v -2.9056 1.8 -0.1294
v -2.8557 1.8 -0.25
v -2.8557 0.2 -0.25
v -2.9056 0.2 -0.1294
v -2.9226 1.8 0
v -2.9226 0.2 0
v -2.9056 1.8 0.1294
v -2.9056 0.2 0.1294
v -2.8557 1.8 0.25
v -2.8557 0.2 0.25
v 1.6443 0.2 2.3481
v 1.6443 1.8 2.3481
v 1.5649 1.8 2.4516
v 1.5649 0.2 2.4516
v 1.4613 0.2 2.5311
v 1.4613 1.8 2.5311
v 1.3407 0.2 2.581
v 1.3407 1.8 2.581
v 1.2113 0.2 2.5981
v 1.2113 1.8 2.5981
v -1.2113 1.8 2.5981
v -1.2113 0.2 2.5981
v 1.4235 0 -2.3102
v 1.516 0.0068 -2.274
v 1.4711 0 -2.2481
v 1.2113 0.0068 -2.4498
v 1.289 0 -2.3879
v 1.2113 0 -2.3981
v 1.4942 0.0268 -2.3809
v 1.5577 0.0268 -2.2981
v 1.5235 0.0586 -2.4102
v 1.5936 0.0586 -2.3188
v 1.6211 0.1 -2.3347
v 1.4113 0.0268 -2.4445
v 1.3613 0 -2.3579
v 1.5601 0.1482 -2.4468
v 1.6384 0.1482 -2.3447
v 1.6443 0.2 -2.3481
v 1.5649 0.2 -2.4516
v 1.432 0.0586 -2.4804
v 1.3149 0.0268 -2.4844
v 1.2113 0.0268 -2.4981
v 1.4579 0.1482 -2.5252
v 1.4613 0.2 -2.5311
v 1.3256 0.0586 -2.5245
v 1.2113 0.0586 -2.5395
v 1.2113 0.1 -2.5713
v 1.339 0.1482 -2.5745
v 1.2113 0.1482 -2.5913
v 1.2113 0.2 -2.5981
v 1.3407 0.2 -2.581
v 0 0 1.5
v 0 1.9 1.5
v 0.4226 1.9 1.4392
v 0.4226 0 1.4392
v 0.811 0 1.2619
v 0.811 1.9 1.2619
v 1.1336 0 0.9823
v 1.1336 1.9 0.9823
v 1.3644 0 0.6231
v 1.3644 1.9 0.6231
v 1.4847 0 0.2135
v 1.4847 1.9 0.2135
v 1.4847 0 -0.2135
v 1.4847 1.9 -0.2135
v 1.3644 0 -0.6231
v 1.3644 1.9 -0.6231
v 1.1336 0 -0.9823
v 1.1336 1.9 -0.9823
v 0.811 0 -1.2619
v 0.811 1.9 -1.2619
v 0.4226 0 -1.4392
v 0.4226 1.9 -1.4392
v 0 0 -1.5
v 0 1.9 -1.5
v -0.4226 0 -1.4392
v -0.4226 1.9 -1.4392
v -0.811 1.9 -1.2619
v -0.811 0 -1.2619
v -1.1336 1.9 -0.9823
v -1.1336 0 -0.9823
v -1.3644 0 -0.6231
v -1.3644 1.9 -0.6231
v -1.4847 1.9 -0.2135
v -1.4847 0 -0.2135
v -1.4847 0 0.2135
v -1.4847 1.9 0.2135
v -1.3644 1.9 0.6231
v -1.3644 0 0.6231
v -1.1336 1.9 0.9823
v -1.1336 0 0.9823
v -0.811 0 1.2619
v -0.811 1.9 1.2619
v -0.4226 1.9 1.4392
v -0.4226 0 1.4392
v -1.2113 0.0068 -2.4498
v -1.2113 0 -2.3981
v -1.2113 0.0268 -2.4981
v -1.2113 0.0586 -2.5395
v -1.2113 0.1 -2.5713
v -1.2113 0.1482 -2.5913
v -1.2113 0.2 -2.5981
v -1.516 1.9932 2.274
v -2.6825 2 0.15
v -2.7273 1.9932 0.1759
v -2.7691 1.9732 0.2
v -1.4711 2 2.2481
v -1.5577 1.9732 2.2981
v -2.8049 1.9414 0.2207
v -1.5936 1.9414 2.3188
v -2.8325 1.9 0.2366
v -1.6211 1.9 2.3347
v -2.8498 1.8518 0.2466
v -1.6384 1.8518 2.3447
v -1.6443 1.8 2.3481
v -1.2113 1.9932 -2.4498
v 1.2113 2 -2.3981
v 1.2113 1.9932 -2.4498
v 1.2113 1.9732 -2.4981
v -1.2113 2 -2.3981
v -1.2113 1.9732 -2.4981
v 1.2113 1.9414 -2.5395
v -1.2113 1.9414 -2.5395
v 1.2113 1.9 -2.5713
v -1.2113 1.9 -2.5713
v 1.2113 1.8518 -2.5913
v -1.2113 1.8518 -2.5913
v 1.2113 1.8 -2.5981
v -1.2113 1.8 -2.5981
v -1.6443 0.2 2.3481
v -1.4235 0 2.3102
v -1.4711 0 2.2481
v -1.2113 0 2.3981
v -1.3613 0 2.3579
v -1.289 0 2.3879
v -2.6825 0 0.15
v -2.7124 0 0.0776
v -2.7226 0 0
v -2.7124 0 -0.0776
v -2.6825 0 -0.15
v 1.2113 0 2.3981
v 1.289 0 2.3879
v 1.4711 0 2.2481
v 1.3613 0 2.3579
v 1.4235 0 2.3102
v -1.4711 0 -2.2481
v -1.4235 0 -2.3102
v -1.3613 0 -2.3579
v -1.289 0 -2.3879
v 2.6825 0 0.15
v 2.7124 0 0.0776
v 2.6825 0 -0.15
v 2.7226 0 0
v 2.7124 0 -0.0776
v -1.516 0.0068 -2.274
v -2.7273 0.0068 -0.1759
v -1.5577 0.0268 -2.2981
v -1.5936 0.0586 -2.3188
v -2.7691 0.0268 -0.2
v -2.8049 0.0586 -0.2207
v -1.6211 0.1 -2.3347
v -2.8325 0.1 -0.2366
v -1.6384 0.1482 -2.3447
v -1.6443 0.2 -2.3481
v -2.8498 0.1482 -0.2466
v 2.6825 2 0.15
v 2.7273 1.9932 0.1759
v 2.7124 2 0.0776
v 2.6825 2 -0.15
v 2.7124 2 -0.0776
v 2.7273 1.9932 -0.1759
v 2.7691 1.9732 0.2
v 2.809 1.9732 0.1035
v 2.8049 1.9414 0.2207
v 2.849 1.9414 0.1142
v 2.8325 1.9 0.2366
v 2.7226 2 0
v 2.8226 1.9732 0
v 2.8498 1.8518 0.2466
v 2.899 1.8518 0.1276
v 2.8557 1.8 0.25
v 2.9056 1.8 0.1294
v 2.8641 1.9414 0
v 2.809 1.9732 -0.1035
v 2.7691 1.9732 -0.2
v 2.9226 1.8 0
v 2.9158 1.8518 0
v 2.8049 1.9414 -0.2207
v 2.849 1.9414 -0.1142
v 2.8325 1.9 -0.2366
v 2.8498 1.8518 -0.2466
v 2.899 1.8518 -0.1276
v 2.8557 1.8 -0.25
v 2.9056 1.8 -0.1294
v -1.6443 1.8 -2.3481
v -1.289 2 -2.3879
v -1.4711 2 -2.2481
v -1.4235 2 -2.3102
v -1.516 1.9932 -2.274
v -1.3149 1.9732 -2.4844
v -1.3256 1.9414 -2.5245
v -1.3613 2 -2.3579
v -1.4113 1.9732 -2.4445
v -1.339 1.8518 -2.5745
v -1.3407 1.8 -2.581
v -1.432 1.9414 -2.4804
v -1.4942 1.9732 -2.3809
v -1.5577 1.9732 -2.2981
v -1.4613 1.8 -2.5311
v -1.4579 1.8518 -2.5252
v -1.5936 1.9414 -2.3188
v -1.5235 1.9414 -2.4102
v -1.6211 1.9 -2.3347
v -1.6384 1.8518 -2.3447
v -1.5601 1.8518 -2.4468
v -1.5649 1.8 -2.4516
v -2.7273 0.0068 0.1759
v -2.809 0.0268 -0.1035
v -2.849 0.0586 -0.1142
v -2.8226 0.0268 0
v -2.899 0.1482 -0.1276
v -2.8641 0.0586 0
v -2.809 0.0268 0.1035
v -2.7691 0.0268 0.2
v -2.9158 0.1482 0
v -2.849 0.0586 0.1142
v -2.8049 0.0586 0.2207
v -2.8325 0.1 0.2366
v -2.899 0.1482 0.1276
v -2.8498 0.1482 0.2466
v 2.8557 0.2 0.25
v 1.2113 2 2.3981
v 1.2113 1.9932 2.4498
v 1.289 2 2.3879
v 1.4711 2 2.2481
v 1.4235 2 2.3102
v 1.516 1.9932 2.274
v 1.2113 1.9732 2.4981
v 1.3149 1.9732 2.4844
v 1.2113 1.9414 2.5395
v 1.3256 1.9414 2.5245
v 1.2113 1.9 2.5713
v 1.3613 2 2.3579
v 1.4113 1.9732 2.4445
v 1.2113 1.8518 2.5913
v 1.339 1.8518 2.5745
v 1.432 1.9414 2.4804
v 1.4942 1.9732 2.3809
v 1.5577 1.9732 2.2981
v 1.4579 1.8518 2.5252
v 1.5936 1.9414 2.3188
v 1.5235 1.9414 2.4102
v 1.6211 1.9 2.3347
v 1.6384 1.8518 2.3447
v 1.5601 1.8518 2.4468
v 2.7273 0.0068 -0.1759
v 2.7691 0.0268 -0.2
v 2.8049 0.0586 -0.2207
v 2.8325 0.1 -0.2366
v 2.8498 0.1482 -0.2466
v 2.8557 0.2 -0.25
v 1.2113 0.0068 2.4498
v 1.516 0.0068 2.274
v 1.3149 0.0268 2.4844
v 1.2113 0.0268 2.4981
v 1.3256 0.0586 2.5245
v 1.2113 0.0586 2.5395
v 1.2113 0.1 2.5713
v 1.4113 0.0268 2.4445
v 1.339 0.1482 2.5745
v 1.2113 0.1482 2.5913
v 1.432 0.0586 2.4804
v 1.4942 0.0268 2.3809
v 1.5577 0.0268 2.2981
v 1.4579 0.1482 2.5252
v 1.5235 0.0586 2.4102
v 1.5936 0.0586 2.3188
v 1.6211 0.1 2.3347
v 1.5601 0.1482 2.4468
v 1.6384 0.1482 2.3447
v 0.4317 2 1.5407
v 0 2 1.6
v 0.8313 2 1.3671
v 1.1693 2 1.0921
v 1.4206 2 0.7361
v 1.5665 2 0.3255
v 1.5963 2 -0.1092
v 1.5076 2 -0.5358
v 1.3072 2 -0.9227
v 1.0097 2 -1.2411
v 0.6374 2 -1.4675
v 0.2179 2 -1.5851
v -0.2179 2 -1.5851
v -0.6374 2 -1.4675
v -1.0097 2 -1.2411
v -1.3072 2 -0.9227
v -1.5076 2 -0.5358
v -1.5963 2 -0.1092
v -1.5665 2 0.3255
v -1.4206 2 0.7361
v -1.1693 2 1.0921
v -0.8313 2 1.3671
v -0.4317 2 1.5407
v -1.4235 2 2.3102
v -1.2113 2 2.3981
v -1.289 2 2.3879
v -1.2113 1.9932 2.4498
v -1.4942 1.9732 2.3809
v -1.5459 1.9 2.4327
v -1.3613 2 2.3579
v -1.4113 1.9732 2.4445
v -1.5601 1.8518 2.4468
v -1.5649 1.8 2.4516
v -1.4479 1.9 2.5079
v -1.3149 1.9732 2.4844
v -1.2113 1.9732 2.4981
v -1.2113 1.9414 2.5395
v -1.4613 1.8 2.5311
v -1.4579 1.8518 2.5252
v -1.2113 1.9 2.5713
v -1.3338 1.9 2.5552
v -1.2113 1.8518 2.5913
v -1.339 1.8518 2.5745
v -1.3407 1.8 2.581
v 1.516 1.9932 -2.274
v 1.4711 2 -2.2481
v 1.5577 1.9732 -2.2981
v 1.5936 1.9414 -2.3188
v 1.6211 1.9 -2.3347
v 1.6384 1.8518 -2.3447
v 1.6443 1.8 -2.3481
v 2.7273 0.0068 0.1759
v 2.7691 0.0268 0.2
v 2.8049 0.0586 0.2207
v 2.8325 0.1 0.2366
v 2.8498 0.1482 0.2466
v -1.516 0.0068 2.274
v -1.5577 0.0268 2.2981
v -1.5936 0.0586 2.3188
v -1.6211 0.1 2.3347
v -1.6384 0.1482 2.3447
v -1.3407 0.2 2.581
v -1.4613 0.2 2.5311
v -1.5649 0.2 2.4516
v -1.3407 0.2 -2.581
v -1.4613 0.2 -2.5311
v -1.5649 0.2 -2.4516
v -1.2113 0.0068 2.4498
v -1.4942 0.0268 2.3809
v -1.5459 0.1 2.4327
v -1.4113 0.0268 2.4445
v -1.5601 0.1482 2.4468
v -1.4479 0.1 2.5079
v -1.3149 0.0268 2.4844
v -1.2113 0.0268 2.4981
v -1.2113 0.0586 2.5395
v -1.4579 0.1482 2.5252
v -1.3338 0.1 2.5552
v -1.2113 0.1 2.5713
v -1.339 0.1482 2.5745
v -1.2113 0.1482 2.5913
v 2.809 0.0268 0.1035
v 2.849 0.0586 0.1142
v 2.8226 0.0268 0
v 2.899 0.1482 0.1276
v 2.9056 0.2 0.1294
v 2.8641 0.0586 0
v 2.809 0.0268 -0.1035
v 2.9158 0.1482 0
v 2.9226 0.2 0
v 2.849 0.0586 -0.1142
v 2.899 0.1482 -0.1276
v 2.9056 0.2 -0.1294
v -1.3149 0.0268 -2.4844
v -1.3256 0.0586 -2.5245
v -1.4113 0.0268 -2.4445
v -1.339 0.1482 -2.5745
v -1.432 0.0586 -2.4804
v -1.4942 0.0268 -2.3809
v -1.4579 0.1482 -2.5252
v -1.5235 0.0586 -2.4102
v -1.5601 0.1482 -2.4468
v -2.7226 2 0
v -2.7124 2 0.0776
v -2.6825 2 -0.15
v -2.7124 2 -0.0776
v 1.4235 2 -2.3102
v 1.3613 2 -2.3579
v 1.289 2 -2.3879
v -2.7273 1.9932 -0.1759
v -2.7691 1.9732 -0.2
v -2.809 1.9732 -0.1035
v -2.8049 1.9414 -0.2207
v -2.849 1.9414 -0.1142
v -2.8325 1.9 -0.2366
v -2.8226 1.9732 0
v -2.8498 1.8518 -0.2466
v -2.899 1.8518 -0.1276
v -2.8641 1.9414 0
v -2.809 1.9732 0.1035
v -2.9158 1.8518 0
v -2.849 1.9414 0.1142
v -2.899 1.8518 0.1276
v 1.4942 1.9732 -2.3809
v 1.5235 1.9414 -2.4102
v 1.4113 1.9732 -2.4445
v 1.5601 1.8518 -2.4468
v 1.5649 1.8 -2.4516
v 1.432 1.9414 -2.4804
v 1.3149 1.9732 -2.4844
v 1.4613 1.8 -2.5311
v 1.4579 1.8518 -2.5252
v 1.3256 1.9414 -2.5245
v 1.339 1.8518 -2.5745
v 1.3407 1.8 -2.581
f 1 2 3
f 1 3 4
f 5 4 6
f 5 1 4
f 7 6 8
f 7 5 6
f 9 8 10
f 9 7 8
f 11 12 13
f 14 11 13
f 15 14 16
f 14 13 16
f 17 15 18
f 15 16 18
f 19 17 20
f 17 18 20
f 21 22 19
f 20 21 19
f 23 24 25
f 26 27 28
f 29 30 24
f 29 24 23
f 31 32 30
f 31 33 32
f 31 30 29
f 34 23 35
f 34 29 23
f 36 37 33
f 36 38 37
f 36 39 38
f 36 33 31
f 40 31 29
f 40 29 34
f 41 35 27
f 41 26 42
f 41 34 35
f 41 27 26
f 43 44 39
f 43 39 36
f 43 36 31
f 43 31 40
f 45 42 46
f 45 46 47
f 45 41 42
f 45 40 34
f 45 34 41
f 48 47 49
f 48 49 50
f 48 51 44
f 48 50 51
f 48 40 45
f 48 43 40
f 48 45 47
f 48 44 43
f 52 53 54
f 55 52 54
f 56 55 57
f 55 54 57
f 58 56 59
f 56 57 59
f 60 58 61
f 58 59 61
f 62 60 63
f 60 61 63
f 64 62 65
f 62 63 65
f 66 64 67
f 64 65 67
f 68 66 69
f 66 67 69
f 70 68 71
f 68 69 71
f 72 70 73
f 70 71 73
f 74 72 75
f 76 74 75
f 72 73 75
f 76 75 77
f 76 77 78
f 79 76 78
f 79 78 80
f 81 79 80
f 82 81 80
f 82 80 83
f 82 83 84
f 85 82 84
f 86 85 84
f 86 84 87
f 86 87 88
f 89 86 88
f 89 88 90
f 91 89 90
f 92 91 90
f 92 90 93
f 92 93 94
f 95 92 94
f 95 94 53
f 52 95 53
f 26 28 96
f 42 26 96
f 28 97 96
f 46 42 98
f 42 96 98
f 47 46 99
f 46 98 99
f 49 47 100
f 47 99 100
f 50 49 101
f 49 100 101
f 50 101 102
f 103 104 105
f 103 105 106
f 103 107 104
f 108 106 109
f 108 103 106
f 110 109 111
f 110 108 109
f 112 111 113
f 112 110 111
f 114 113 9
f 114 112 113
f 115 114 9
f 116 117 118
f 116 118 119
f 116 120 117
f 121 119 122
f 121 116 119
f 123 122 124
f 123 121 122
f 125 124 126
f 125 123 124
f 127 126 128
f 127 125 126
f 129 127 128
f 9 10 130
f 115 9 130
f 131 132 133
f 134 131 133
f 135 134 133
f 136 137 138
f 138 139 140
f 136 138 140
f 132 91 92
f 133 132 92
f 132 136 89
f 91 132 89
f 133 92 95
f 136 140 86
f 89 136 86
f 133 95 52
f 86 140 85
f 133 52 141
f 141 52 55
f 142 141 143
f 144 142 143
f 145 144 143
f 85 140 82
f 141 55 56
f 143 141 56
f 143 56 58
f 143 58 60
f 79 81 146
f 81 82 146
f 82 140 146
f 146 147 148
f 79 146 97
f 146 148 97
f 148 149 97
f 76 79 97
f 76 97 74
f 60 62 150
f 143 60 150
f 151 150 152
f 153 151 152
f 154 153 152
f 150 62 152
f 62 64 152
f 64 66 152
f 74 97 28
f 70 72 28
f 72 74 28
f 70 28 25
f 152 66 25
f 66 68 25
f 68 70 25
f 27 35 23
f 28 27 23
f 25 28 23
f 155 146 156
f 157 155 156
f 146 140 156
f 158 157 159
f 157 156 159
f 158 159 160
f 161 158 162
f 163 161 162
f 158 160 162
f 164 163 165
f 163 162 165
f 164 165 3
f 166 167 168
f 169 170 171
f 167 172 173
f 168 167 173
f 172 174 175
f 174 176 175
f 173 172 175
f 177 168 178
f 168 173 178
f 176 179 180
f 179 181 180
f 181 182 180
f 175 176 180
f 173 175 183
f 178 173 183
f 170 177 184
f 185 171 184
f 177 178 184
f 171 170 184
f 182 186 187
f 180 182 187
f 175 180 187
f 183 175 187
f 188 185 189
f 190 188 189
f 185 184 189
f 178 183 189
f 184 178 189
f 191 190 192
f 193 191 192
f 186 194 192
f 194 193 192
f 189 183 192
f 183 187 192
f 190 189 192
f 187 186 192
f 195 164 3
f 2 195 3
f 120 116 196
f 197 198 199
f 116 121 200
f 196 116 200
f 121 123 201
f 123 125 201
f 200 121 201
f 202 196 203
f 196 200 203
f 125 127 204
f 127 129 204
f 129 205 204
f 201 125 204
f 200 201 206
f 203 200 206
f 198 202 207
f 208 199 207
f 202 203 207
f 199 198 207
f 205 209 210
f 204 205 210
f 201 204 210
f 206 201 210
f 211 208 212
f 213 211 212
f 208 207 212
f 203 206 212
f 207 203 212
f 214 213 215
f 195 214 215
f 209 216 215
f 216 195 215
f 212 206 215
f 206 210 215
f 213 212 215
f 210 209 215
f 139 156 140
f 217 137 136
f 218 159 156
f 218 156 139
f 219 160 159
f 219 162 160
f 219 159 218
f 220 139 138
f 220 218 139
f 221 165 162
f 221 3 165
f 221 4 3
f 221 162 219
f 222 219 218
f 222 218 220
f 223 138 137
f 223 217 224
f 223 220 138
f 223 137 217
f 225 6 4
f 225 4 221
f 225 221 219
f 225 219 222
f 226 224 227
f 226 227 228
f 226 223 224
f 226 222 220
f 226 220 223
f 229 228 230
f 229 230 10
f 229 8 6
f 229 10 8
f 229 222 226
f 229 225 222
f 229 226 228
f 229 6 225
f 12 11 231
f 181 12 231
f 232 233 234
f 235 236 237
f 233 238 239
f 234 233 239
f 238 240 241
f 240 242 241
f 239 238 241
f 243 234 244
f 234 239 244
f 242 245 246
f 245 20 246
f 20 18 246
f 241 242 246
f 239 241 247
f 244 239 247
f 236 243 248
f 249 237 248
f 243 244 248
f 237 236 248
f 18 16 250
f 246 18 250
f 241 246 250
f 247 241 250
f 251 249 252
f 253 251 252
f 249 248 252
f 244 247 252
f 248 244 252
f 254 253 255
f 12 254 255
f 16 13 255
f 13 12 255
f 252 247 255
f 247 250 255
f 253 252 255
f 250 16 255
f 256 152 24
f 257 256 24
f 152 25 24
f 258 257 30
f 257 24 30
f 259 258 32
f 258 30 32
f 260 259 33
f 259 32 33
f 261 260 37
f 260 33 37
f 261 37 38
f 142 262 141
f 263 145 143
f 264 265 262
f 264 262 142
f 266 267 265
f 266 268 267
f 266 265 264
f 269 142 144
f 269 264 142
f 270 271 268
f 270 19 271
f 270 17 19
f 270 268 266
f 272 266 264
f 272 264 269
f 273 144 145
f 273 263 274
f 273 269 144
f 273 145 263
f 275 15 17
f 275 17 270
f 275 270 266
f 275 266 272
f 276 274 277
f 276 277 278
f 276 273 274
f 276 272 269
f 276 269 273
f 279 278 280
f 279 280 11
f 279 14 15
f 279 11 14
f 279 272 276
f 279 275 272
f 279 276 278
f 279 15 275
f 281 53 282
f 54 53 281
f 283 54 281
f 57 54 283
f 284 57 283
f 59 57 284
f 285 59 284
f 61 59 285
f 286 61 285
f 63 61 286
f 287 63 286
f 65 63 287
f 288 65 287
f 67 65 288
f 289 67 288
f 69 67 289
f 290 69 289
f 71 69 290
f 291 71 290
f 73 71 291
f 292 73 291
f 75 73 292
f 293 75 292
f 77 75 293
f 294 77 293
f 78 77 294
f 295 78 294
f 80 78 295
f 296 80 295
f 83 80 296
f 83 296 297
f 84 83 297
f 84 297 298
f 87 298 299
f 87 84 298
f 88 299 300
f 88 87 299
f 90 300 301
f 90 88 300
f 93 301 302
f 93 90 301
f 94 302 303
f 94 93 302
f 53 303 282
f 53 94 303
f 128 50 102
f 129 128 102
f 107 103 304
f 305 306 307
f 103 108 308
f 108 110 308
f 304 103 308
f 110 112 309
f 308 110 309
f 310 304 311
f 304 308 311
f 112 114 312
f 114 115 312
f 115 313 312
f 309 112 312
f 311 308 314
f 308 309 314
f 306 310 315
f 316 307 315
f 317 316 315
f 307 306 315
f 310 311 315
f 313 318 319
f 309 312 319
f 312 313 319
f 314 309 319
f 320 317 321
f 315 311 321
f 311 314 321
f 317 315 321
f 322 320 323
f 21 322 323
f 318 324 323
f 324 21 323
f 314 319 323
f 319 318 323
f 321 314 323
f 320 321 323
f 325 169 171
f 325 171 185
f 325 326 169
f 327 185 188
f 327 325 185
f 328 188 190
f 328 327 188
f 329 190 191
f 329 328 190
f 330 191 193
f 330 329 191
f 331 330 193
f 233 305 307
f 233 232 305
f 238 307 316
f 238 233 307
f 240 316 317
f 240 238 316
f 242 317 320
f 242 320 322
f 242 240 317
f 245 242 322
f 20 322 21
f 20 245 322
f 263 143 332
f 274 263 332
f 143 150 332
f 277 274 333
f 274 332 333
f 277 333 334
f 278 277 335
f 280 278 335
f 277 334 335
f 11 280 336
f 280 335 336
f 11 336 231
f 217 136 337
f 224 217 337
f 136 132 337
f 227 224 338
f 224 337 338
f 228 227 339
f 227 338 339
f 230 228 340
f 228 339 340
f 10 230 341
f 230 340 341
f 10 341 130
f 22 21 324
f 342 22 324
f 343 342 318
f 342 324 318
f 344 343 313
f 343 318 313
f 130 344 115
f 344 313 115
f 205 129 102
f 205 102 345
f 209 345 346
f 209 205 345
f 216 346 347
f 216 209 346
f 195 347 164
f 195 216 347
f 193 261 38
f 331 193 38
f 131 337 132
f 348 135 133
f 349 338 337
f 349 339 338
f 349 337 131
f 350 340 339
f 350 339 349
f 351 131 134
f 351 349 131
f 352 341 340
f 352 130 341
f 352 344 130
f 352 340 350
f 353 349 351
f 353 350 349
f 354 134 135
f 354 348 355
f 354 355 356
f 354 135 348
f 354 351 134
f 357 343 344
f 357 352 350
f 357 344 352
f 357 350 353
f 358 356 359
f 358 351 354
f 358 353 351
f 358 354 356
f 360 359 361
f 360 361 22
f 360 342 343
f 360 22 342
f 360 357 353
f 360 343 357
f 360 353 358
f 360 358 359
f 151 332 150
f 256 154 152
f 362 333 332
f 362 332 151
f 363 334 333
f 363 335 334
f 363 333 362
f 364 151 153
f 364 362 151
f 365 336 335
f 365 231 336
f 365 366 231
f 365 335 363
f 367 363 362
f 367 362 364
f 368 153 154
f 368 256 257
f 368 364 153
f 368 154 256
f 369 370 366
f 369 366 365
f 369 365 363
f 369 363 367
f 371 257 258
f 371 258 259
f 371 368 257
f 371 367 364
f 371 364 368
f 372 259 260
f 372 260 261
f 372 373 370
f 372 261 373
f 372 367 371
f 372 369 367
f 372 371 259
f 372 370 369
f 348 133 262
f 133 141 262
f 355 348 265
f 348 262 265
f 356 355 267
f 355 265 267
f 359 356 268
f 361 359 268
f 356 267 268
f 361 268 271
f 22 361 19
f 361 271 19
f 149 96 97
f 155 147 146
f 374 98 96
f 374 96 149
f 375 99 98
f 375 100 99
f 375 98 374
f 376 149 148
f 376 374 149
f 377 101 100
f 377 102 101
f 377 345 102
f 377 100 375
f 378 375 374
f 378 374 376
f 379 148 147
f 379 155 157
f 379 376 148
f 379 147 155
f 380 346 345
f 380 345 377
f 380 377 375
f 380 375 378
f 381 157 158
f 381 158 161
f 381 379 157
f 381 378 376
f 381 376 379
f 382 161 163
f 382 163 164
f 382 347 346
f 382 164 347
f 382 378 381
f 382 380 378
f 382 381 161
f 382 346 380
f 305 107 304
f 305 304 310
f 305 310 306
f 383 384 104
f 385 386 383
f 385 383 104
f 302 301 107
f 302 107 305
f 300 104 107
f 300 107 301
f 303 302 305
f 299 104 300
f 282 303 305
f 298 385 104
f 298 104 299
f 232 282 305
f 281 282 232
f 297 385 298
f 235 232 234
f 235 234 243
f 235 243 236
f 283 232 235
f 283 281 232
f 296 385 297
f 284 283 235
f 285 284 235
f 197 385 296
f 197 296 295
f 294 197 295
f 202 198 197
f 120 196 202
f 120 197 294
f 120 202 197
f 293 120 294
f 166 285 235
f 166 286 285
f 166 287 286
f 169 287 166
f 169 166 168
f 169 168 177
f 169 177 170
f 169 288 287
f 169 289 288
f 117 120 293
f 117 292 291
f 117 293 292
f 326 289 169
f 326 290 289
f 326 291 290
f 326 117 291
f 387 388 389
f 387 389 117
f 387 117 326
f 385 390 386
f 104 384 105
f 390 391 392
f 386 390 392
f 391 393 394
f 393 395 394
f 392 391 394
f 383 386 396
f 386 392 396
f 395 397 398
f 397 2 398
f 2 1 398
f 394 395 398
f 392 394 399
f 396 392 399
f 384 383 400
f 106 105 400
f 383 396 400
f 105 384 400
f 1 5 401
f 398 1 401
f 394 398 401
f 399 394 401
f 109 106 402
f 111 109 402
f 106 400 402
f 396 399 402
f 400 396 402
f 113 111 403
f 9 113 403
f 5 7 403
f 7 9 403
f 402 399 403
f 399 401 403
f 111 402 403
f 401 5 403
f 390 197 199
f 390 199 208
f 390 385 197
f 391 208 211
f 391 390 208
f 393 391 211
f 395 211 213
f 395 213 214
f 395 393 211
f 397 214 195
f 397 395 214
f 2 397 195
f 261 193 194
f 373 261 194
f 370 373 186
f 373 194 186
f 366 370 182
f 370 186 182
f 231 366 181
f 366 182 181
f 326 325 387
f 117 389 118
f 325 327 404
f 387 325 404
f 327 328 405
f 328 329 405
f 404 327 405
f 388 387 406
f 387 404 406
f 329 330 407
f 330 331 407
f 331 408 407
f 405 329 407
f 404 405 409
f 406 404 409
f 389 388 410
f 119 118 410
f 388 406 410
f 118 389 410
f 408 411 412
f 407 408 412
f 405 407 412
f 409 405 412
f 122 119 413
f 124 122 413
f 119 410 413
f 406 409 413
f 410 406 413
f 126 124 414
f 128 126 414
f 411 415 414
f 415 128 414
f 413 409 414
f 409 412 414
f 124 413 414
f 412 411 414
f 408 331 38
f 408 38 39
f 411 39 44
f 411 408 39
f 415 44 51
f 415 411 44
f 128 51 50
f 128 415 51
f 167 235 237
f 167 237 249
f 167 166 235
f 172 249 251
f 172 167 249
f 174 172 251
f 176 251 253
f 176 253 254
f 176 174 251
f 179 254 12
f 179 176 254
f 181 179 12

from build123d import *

# Parameters (mm, degrees)
BOSS_EXTRUDE1_DEPTH = 2
SKETCH2_R           = 1.5
CUT_EXTRUDE1_DEPTH  = 5.444097209
FILLET1_R           = 0.5
FILLET2_R           = 0.2
CHAMFER1_SIZE       = 0.1


with BuildPart() as part:
    # Sketch1 → Boss-Extrude1 (new body)
    with BuildSketch(Plane(origin=(0, 0, 0), x_dir=(1, 0, 0), z_dir=(0, 1, 0))):
        Polygon((3, 0), (1.5, 2.598076211), (-1.5, 2.598076211), (-3, 0), (-1.5, -2.598076211), (1.5, -2.598076211), align=None)
    extrude(amount=BOSS_EXTRUDE1_DEPTH)

    # Sketch2 → Cut-Extrude1 (cut, through all)
    with BuildSketch(Plane(origin=(0, 2, 0), x_dir=(1, 0, 0), z_dir=(0, 1, 0))):
        with Locations(Location((0, 0, 0), (0, 0, 270))):
            Circle(SKETCH2_R)
    extrude(amount=-CUT_EXTRUDE1_DEPTH, mode=Mode.SUBTRACT)

    # Fillet1
    fillet1_edges = [part.edges().sort_by_distance(p)[0] for p in [
        (1.5, 1, 2.598076211),
        (-1.5, 1, 2.598076211),
        (-3, 1, 0),
        (-1.5, 1, -2.598076211),
        (1.5, 1, -2.598076211),
        (3, 1, 0),
    ]]
    fillet(fillet1_edges, radius=FILLET1_R)

    # Fillet2
    fillet2_edges = [part.edges().sort_by_distance(p)[0] for p in [
        (0, 0, 2.598076211),
        (0, 2, 2.598076211),
        (2.25, 0, 1.299038106),
        (-2.25, 0, 1.299038106),
        (-2.25, 0, -1.299038106),
        (0, 0, -2.598076211),
        (2.25, 0, -1.299038106),
        (1.461324865, 0, 2.531088913),
        (2.922649731, 0, 0),
        (1.461324865, 0, -2.531088913),
        (-1.461324865, 0, -2.531088913),
        (-2.922649731, 0, 0),
        (-1.461324865, 0, 2.531088913),
        (-2.25, 2, 1.299038106),
        (2.25, 2, 1.299038106),
        (2.25, 2, -1.299038106),
        (0, 2, -2.598076211),
        (-2.25, 2, -1.299038106),
        (1.461324865, 2, 2.531088913),
        (2.922649731, 2, 0),
        (1.461324865, 2, -2.531088913),
        (-1.461324865, 2, -2.531088913),
        (-2.922649731, 2, 0),
        (-1.461324865, 2, 2.531088913),
    ]]
    fillet(fillet2_edges, radius=FILLET2_R)

    # Chamfer1
    chamfer1_edges = [part.edges().sort_by_distance(p)[0] for p in [
        (0, 2, -1.5),
    ]]
    chamfer(chamfer1_edges, length=CHAMFER1_SIZE)


solid = part.part
